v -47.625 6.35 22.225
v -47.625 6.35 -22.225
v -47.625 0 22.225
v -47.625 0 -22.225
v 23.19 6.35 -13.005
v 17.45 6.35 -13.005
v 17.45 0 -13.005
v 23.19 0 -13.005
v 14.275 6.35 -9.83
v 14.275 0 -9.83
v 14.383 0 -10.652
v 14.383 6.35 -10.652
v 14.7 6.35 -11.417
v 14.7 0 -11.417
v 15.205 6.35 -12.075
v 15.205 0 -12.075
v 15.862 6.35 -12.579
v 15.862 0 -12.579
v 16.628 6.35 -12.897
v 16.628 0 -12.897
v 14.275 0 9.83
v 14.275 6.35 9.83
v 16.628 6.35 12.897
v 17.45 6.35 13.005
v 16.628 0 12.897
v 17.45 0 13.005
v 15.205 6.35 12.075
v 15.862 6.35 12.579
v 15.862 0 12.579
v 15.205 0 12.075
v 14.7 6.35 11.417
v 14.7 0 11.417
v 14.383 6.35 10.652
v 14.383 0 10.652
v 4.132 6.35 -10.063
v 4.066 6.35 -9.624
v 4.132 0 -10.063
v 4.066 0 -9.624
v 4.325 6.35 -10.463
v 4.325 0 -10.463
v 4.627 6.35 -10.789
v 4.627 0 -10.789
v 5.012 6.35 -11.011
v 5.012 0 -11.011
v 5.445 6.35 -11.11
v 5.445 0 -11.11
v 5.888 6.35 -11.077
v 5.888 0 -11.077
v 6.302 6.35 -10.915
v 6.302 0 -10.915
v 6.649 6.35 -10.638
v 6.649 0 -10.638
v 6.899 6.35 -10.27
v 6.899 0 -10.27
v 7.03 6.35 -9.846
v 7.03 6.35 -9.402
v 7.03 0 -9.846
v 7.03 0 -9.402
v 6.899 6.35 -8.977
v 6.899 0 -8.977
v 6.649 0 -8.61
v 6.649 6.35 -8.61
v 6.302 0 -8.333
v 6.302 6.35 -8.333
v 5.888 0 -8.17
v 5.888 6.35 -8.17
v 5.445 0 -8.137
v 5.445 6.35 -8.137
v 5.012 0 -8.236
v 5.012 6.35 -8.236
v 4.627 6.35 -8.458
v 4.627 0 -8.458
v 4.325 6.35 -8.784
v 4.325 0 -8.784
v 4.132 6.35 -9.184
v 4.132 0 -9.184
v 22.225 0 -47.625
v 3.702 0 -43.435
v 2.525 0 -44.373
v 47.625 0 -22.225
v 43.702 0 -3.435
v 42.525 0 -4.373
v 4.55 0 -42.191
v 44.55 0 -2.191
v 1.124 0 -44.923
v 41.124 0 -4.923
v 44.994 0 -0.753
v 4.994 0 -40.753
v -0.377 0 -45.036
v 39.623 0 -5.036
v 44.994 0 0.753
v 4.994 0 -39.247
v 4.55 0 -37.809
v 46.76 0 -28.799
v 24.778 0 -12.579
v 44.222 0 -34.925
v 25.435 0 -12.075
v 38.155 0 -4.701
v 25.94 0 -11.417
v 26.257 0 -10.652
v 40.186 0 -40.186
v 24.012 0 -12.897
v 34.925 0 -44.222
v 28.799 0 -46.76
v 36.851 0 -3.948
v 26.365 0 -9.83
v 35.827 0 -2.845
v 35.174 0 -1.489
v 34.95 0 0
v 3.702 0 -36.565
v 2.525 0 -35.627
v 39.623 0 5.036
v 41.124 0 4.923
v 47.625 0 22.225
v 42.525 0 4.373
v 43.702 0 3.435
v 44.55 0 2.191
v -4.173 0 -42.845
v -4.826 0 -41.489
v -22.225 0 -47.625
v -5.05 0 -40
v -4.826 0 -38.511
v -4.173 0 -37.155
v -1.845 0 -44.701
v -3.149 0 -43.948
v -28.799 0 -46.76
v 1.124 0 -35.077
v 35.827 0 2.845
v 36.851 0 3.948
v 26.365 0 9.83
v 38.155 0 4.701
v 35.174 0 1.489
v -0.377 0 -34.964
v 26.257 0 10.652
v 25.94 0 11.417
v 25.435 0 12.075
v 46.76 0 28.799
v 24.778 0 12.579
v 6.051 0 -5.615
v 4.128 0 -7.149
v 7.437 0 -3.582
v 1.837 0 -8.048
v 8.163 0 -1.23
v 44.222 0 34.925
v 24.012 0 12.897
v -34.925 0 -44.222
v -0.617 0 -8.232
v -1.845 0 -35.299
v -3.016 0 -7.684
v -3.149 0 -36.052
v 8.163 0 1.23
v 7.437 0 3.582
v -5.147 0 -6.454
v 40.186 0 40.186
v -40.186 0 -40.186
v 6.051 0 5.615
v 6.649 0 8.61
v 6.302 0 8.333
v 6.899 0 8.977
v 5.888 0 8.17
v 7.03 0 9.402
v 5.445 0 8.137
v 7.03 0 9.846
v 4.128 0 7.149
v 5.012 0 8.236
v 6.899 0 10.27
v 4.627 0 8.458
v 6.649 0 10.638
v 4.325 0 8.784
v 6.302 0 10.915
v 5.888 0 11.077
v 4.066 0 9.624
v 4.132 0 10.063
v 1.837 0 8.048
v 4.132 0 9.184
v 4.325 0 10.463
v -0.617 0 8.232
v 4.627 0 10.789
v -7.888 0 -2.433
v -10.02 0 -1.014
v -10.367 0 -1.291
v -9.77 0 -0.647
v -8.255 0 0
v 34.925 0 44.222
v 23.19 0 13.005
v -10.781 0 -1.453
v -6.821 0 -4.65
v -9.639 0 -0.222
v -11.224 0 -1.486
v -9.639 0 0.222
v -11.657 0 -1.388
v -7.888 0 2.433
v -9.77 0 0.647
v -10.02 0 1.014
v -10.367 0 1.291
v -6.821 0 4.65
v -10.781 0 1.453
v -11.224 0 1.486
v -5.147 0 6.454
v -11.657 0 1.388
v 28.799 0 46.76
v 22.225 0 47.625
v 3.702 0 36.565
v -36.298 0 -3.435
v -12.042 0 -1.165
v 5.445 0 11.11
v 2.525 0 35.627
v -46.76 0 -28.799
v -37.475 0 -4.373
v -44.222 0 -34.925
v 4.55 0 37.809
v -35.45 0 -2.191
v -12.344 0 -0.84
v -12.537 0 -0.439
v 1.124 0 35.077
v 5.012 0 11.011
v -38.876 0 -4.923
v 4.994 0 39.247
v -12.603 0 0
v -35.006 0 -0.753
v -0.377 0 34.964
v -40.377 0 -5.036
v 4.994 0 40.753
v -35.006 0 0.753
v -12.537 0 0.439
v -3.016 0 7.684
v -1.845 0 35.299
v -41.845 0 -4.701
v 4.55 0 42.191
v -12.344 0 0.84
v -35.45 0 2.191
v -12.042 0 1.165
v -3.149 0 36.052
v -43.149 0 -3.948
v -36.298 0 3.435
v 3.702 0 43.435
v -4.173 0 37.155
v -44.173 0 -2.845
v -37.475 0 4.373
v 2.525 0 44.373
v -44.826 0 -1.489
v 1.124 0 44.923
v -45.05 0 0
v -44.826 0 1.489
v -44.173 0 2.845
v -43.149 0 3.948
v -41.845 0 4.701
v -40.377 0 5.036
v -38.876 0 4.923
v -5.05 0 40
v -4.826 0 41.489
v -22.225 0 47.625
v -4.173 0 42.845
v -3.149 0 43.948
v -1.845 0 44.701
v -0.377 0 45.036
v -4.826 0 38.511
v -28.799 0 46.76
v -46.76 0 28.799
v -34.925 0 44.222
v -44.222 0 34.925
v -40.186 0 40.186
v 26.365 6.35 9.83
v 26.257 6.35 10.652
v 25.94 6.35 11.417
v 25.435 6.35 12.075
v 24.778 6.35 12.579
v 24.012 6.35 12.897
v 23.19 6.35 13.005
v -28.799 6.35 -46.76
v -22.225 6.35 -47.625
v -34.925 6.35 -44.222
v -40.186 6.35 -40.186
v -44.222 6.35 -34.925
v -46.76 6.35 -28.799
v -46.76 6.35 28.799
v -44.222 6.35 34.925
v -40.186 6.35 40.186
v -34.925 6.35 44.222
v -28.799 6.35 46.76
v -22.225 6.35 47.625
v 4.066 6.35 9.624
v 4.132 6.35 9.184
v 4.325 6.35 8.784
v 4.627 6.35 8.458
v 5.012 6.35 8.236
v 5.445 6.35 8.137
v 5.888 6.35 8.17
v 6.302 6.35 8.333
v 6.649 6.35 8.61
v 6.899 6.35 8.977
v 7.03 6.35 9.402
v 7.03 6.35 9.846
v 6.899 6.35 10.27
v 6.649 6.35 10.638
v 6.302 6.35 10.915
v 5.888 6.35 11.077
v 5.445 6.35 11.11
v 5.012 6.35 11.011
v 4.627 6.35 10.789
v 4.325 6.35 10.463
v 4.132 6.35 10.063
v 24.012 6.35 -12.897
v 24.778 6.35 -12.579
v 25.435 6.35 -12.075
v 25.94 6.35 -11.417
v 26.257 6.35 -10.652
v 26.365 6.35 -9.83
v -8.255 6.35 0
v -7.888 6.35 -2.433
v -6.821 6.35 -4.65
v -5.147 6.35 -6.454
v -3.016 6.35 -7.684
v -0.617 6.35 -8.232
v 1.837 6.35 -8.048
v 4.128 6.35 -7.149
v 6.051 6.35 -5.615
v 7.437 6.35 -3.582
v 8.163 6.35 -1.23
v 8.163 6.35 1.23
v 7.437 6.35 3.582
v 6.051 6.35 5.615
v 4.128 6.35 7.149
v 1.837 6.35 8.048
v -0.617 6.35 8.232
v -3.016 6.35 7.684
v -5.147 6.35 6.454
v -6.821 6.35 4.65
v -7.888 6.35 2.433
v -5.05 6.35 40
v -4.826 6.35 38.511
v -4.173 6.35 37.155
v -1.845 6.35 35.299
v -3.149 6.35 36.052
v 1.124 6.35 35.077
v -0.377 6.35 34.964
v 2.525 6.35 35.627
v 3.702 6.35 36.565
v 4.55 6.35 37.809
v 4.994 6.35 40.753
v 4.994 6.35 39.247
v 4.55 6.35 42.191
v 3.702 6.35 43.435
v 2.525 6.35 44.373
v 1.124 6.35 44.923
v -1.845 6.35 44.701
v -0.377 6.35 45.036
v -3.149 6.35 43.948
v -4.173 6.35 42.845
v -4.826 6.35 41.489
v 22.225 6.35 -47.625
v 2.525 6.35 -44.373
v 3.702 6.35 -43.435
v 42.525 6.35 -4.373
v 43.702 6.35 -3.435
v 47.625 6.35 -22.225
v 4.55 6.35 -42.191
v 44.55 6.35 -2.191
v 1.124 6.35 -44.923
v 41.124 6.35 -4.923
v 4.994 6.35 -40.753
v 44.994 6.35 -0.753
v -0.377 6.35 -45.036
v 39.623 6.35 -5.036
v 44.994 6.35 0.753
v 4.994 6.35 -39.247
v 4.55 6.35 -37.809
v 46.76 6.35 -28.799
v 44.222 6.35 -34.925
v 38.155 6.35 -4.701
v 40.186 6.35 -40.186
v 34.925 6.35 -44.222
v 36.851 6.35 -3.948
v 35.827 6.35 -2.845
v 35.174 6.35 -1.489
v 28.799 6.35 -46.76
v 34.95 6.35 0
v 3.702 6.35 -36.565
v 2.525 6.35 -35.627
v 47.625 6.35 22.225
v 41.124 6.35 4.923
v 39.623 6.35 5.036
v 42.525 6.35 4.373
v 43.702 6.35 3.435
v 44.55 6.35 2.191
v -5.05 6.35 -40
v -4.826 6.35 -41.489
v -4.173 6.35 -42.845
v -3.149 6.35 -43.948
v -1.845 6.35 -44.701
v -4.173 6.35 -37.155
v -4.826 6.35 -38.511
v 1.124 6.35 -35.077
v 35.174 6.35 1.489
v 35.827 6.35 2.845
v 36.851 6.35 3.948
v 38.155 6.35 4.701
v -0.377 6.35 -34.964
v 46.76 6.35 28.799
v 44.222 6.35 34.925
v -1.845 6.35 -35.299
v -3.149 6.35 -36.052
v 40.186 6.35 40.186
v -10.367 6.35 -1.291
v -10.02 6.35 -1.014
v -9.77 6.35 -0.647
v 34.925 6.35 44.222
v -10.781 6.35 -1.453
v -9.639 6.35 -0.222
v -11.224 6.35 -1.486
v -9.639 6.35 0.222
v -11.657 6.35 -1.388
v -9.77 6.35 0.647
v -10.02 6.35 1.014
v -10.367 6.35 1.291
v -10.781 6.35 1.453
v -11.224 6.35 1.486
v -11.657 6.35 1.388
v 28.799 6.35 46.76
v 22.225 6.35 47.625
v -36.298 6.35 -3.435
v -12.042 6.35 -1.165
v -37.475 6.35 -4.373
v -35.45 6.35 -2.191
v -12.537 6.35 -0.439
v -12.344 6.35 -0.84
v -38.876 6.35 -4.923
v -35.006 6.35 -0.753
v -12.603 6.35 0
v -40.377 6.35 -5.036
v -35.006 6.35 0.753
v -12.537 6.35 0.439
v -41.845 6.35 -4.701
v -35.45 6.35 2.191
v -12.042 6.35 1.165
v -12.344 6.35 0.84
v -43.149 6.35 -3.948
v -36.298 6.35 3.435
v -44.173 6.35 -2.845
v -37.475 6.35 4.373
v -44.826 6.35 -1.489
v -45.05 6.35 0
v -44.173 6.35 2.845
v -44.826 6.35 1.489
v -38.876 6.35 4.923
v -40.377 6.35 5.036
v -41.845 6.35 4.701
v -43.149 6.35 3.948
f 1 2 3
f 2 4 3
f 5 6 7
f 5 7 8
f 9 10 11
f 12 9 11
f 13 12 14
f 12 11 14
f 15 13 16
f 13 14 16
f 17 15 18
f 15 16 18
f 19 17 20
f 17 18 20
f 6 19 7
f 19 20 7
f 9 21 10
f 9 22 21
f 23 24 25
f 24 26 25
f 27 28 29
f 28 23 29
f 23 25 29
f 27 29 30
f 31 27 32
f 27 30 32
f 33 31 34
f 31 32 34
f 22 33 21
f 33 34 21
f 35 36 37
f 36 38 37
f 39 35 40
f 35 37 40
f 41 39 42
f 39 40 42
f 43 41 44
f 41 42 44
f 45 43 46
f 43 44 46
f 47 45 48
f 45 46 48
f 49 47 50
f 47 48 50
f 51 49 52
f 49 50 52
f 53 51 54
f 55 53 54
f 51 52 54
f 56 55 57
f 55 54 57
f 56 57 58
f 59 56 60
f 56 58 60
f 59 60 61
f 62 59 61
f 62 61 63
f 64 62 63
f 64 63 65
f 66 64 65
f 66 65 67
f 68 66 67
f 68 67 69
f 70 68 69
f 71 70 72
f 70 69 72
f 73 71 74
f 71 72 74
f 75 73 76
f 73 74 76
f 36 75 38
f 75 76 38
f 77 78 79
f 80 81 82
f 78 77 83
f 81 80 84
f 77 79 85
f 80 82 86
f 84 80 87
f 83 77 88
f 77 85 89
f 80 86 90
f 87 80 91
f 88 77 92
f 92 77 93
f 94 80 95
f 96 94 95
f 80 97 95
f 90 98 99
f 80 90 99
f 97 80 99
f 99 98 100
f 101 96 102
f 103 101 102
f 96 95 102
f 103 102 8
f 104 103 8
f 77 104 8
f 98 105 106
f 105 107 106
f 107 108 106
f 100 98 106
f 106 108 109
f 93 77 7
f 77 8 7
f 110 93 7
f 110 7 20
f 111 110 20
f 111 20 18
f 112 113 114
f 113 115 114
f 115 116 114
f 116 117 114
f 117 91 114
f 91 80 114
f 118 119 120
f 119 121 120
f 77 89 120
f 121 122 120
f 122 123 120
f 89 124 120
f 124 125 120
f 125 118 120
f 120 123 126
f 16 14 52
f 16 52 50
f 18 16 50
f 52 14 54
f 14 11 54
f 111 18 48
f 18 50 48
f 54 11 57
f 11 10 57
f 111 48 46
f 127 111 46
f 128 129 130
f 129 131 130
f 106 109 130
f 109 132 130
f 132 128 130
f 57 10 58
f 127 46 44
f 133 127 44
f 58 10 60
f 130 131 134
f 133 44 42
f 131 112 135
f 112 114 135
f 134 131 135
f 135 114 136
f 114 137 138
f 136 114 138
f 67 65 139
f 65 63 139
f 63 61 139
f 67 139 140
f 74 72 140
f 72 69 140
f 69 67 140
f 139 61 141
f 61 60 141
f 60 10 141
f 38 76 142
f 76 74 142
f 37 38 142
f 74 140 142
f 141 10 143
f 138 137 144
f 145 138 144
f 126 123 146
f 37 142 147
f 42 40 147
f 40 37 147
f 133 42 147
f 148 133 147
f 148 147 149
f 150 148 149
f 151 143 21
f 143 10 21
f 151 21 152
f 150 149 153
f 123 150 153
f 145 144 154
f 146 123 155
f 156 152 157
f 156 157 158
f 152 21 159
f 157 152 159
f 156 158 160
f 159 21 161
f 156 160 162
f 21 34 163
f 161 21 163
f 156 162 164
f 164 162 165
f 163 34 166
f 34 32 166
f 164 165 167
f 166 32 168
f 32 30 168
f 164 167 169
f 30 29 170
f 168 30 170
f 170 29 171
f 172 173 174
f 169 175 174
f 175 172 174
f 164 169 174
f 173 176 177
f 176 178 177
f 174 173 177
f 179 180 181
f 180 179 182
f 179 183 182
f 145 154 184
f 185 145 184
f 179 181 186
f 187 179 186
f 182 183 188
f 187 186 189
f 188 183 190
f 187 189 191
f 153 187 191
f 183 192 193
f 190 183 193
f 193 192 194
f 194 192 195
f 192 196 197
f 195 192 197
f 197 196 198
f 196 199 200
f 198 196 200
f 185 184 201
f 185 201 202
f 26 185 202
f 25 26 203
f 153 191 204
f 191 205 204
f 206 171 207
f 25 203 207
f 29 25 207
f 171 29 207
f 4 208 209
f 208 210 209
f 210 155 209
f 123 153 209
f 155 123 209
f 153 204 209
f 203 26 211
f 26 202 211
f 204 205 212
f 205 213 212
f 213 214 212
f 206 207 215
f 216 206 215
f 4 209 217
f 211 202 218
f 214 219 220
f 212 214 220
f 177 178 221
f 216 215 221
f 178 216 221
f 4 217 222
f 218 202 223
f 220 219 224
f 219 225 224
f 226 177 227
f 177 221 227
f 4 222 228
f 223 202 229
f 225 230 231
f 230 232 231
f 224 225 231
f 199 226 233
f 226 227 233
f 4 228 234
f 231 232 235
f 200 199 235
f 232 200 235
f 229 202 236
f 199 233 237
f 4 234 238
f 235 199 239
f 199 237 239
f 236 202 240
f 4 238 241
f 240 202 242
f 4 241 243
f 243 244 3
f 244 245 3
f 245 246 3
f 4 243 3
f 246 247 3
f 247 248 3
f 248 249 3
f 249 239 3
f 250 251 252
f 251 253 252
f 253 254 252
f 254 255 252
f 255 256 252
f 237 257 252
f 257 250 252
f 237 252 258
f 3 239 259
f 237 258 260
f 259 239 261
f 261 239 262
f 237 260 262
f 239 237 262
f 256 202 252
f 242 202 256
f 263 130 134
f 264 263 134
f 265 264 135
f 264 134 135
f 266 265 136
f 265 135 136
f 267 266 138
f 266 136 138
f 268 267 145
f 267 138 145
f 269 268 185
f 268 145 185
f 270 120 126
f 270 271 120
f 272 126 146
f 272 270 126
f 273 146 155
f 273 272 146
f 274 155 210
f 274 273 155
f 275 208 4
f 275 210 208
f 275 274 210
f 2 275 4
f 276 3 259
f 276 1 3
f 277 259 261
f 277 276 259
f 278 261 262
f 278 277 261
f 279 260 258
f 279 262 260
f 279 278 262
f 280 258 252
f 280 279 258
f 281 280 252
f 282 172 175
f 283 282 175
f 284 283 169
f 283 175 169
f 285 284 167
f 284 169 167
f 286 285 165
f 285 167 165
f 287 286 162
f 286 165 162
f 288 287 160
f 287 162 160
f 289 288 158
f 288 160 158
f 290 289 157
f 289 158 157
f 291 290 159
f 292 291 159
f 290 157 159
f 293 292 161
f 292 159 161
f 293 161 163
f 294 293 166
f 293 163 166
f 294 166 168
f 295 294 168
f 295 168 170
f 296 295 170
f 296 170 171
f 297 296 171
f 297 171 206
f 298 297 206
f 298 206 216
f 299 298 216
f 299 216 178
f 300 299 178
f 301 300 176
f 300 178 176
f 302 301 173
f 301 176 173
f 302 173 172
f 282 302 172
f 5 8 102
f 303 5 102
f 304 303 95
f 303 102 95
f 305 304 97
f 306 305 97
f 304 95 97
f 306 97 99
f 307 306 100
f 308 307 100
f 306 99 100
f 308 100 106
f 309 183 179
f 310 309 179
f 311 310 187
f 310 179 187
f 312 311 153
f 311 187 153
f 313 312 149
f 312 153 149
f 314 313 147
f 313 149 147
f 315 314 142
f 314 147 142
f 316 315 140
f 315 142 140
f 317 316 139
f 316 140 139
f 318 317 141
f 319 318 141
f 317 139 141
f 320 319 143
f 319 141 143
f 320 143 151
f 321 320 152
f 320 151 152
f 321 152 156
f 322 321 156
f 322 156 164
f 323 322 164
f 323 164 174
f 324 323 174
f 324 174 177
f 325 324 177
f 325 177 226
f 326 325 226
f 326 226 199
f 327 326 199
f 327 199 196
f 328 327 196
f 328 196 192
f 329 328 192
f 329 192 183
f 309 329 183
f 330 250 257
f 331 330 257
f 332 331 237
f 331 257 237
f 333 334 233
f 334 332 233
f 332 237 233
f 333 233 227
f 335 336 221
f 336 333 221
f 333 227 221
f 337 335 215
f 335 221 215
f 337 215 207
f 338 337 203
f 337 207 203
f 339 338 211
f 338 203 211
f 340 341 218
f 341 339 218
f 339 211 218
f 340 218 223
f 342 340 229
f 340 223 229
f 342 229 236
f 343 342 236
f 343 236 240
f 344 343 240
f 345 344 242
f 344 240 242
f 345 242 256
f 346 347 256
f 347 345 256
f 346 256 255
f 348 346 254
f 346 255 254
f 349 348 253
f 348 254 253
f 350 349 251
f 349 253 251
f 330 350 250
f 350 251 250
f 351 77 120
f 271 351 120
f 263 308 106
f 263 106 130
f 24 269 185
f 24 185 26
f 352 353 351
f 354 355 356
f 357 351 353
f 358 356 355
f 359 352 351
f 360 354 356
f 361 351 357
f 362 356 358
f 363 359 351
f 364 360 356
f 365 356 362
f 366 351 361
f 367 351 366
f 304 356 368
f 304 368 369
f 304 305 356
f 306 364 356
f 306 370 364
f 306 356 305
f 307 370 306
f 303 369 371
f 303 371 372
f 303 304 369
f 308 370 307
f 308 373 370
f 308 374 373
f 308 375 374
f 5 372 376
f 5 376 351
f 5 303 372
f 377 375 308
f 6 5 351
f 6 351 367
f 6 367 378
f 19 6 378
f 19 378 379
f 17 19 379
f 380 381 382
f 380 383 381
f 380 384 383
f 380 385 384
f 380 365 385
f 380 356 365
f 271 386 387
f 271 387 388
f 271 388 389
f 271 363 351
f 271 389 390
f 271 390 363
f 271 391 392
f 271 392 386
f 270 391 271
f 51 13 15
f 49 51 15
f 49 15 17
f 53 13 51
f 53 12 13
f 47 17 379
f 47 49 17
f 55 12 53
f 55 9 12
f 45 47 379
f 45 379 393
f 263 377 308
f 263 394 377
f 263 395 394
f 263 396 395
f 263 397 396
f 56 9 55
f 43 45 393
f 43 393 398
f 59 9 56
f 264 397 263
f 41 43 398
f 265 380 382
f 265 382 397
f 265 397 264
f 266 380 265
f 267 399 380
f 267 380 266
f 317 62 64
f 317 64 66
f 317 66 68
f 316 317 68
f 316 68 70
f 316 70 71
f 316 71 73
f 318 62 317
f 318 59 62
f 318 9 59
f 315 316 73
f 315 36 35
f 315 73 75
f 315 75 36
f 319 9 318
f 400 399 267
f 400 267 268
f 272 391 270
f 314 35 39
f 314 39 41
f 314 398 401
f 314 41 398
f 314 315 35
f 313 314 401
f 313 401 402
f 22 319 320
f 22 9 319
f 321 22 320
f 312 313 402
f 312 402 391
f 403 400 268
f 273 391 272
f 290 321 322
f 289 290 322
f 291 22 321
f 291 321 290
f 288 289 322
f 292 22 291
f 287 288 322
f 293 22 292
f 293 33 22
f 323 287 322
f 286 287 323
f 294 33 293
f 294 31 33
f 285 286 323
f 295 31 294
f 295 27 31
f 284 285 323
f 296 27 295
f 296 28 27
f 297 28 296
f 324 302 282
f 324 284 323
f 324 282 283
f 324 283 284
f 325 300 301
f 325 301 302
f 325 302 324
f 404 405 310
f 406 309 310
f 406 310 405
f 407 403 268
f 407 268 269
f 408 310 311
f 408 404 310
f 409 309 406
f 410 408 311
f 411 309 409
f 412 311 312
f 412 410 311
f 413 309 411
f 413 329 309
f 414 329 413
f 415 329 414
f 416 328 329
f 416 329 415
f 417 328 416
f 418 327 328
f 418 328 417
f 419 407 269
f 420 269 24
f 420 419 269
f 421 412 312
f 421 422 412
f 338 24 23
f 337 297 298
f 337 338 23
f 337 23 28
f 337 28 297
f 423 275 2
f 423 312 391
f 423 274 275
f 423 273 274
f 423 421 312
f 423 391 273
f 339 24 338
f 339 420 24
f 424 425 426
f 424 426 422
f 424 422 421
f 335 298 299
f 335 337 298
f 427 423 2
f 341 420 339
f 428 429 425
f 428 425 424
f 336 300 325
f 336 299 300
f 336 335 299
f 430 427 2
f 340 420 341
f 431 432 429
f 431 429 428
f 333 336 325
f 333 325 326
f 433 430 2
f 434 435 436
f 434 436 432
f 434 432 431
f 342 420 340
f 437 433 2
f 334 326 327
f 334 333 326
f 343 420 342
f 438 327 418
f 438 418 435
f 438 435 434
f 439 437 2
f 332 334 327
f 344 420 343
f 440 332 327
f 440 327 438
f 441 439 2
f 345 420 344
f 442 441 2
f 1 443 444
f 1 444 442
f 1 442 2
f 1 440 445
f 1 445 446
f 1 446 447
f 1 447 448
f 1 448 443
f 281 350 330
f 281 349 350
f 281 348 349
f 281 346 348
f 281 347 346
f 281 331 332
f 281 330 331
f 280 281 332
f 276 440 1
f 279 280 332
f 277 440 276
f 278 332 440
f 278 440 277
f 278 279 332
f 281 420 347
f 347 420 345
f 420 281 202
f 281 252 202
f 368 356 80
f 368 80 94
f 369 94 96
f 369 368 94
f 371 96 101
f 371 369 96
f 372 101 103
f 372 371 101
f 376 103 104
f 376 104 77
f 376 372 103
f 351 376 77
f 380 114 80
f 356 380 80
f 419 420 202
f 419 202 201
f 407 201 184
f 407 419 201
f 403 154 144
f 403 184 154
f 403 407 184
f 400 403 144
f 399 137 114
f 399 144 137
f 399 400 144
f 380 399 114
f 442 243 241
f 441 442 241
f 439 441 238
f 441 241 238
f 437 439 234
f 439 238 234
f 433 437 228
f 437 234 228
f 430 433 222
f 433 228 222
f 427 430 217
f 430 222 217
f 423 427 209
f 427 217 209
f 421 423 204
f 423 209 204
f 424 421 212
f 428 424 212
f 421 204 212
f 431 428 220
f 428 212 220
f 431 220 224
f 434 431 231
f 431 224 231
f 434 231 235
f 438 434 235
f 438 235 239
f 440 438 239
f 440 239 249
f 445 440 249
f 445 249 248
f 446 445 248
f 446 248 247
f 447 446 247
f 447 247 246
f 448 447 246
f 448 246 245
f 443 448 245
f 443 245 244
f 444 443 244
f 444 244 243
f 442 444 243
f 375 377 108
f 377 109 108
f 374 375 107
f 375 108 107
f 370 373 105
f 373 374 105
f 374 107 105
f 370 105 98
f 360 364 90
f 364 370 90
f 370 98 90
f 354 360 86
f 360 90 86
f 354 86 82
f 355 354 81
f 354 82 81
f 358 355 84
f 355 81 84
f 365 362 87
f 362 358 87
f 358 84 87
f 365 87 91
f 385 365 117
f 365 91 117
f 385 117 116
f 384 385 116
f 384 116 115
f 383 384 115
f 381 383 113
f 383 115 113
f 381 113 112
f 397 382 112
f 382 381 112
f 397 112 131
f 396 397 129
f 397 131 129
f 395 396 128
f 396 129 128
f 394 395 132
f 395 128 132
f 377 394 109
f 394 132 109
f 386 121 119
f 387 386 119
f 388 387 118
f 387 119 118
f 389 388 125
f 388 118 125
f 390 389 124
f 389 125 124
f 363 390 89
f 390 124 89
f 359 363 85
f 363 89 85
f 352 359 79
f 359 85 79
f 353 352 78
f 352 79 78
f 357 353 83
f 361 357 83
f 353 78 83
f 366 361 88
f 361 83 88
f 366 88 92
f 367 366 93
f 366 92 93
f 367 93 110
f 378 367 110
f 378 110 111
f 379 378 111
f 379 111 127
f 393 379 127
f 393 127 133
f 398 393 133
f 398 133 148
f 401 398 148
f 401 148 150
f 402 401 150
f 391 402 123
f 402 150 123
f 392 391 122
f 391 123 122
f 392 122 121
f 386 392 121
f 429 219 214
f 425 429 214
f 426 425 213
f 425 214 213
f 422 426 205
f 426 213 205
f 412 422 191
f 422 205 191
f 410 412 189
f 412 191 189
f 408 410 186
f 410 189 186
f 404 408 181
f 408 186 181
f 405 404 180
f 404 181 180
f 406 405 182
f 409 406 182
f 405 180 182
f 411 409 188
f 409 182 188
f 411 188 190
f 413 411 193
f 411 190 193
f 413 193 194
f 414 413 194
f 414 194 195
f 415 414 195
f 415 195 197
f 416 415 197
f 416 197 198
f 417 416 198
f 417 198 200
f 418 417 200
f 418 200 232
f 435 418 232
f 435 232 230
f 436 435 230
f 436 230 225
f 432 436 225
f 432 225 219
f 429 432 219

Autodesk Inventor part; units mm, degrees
ref_plane "YZ Plane" through (0, 0, 0) normal (1, 0, 0) x (0, 1, 0)
ref_plane "XZ Plane" through (0, 0, 0) normal (0, 1, 0) x (-1, 0, 0)
ref_plane "XY Plane" through (0, 0, 0) normal (0, 0, 1) x (1, 0, 0)
sketch "Sketch3" plane through (0, 0, 0) normal (0, 1, 0) x (-1, 0, 0)
  circle A0 centre (11.1125, 0) radius 1.4906
  circle A1 centre (-5.5563, 9.6237) radius 1.4906
  circle A2 centre (-5.5562, -9.6237) radius 1.4906
  circle A3 centre (0, 0) radius 8.255
  line L0 (0, 0) -> (11.1125, 0)
  line L1 (0, 0) -> (-5.5563, 9.6237)
  line L2 (0, 0) -> (-5.5562, -9.6237)
  line L3 (0, 11.7306) -> (0, -34.9786)
  line L4 (38.6398, 0) -> (-3.2951, 0)
  circle A4 centre (40, 0) radius 5.05
  circle A5 centre (0, -40) radius 5.05
  circle A6 centre (0, 40) radius 5.05
  circle A7 centre (-40, 0) radius 5.05
  line L5 (-47.625, -47.625) -> (47.625, -47.625)
  line L6 (47.625, -47.625) -> (47.625, 47.625)
  line L7 (47.625, 47.625) -> (-47.625, 47.625)
  line L8 (-47.625, 47.625) -> (-47.625, -47.625)
  line L9 (-47.625, -47.625) -> (47.625, 47.625) construction
  line L10 (47.625, -47.625) -> (-47.625, 47.625) construction
  dimension "d19" = 120
  dimension "d20" = 120
  dimension "d21" = 11.1125
  dimension "d22" = 11.1125
  dimension "d23" = 11.1125
  dimension "d24" = 2.9811
  dimension "d25" = 2.9811
  dimension "d26" = 2.9811
  dimension "d27" = 80
  dimension "d28" = 80
  dimension "d29" = 10.1
  dimension "d30" = 10.1
  dimension "d31" = 95.25
  dimension "d32" = 95.25
  dimension "d36" = 16.51
extrude "Extrusion6" add sketch "Sketch3" along normal blind 6.35
fillet "Fillet1" radius 25.4 4 edges at (-47.625, 3.175, 47.625) (47.625, 3.175, 47.625) (47.625, 3.175, -47.625) (-47.625, 3.175, -47.625)
sketch "Sketch4" plane through (0, 6.35, 0) normal (0, 1, 0) x (1, 0, 0)
  line L0 (14.2748, 13.0048) -> (26.3652, 13.0048)
  line L1 (26.3652, 13.0048) -> (26.3652, -13.0048)
  line L2 (26.3652, -13.0048) -> (14.2748, -13.0048)
  line L3 (14.2748, -13.0048) -> (14.2748, 13.0048)
  line L4 (0, 0) -> (20.32, 0) construction
  point P0 (-11.2012, 0)
  point P1 (16.8026, 0)
  point P2 (26.3652, 0)
  point P3 (20.32, 13.0048)
  dimension "d39" = 12.0904
  dimension "d40" = 26.0096
  dimension "d41" = 20.32
extrude "Extrusion7" cut sketch "Sketch4" against normal up to next
fillet "Fillet2" radius 3.175 4 edges at (14.2748, 3.175, -13.0048) (14.2748, 3.175, 13.0048) (26.3652, 3.175, -13.0048) (26.3652, 3.175, 13.0048)
equation "\"d22\" = d21"
equation "\"d23\" = d21"
equation "\"d25\" = d24"
equation "\"d26\" = d24"
equation "\"d28\" = d27"
equation "\"d30\" = d29"
equation "\"d32\" = d31"
properties part number "Vertical_Lead_Screw_Plate_With_E-Stop"
